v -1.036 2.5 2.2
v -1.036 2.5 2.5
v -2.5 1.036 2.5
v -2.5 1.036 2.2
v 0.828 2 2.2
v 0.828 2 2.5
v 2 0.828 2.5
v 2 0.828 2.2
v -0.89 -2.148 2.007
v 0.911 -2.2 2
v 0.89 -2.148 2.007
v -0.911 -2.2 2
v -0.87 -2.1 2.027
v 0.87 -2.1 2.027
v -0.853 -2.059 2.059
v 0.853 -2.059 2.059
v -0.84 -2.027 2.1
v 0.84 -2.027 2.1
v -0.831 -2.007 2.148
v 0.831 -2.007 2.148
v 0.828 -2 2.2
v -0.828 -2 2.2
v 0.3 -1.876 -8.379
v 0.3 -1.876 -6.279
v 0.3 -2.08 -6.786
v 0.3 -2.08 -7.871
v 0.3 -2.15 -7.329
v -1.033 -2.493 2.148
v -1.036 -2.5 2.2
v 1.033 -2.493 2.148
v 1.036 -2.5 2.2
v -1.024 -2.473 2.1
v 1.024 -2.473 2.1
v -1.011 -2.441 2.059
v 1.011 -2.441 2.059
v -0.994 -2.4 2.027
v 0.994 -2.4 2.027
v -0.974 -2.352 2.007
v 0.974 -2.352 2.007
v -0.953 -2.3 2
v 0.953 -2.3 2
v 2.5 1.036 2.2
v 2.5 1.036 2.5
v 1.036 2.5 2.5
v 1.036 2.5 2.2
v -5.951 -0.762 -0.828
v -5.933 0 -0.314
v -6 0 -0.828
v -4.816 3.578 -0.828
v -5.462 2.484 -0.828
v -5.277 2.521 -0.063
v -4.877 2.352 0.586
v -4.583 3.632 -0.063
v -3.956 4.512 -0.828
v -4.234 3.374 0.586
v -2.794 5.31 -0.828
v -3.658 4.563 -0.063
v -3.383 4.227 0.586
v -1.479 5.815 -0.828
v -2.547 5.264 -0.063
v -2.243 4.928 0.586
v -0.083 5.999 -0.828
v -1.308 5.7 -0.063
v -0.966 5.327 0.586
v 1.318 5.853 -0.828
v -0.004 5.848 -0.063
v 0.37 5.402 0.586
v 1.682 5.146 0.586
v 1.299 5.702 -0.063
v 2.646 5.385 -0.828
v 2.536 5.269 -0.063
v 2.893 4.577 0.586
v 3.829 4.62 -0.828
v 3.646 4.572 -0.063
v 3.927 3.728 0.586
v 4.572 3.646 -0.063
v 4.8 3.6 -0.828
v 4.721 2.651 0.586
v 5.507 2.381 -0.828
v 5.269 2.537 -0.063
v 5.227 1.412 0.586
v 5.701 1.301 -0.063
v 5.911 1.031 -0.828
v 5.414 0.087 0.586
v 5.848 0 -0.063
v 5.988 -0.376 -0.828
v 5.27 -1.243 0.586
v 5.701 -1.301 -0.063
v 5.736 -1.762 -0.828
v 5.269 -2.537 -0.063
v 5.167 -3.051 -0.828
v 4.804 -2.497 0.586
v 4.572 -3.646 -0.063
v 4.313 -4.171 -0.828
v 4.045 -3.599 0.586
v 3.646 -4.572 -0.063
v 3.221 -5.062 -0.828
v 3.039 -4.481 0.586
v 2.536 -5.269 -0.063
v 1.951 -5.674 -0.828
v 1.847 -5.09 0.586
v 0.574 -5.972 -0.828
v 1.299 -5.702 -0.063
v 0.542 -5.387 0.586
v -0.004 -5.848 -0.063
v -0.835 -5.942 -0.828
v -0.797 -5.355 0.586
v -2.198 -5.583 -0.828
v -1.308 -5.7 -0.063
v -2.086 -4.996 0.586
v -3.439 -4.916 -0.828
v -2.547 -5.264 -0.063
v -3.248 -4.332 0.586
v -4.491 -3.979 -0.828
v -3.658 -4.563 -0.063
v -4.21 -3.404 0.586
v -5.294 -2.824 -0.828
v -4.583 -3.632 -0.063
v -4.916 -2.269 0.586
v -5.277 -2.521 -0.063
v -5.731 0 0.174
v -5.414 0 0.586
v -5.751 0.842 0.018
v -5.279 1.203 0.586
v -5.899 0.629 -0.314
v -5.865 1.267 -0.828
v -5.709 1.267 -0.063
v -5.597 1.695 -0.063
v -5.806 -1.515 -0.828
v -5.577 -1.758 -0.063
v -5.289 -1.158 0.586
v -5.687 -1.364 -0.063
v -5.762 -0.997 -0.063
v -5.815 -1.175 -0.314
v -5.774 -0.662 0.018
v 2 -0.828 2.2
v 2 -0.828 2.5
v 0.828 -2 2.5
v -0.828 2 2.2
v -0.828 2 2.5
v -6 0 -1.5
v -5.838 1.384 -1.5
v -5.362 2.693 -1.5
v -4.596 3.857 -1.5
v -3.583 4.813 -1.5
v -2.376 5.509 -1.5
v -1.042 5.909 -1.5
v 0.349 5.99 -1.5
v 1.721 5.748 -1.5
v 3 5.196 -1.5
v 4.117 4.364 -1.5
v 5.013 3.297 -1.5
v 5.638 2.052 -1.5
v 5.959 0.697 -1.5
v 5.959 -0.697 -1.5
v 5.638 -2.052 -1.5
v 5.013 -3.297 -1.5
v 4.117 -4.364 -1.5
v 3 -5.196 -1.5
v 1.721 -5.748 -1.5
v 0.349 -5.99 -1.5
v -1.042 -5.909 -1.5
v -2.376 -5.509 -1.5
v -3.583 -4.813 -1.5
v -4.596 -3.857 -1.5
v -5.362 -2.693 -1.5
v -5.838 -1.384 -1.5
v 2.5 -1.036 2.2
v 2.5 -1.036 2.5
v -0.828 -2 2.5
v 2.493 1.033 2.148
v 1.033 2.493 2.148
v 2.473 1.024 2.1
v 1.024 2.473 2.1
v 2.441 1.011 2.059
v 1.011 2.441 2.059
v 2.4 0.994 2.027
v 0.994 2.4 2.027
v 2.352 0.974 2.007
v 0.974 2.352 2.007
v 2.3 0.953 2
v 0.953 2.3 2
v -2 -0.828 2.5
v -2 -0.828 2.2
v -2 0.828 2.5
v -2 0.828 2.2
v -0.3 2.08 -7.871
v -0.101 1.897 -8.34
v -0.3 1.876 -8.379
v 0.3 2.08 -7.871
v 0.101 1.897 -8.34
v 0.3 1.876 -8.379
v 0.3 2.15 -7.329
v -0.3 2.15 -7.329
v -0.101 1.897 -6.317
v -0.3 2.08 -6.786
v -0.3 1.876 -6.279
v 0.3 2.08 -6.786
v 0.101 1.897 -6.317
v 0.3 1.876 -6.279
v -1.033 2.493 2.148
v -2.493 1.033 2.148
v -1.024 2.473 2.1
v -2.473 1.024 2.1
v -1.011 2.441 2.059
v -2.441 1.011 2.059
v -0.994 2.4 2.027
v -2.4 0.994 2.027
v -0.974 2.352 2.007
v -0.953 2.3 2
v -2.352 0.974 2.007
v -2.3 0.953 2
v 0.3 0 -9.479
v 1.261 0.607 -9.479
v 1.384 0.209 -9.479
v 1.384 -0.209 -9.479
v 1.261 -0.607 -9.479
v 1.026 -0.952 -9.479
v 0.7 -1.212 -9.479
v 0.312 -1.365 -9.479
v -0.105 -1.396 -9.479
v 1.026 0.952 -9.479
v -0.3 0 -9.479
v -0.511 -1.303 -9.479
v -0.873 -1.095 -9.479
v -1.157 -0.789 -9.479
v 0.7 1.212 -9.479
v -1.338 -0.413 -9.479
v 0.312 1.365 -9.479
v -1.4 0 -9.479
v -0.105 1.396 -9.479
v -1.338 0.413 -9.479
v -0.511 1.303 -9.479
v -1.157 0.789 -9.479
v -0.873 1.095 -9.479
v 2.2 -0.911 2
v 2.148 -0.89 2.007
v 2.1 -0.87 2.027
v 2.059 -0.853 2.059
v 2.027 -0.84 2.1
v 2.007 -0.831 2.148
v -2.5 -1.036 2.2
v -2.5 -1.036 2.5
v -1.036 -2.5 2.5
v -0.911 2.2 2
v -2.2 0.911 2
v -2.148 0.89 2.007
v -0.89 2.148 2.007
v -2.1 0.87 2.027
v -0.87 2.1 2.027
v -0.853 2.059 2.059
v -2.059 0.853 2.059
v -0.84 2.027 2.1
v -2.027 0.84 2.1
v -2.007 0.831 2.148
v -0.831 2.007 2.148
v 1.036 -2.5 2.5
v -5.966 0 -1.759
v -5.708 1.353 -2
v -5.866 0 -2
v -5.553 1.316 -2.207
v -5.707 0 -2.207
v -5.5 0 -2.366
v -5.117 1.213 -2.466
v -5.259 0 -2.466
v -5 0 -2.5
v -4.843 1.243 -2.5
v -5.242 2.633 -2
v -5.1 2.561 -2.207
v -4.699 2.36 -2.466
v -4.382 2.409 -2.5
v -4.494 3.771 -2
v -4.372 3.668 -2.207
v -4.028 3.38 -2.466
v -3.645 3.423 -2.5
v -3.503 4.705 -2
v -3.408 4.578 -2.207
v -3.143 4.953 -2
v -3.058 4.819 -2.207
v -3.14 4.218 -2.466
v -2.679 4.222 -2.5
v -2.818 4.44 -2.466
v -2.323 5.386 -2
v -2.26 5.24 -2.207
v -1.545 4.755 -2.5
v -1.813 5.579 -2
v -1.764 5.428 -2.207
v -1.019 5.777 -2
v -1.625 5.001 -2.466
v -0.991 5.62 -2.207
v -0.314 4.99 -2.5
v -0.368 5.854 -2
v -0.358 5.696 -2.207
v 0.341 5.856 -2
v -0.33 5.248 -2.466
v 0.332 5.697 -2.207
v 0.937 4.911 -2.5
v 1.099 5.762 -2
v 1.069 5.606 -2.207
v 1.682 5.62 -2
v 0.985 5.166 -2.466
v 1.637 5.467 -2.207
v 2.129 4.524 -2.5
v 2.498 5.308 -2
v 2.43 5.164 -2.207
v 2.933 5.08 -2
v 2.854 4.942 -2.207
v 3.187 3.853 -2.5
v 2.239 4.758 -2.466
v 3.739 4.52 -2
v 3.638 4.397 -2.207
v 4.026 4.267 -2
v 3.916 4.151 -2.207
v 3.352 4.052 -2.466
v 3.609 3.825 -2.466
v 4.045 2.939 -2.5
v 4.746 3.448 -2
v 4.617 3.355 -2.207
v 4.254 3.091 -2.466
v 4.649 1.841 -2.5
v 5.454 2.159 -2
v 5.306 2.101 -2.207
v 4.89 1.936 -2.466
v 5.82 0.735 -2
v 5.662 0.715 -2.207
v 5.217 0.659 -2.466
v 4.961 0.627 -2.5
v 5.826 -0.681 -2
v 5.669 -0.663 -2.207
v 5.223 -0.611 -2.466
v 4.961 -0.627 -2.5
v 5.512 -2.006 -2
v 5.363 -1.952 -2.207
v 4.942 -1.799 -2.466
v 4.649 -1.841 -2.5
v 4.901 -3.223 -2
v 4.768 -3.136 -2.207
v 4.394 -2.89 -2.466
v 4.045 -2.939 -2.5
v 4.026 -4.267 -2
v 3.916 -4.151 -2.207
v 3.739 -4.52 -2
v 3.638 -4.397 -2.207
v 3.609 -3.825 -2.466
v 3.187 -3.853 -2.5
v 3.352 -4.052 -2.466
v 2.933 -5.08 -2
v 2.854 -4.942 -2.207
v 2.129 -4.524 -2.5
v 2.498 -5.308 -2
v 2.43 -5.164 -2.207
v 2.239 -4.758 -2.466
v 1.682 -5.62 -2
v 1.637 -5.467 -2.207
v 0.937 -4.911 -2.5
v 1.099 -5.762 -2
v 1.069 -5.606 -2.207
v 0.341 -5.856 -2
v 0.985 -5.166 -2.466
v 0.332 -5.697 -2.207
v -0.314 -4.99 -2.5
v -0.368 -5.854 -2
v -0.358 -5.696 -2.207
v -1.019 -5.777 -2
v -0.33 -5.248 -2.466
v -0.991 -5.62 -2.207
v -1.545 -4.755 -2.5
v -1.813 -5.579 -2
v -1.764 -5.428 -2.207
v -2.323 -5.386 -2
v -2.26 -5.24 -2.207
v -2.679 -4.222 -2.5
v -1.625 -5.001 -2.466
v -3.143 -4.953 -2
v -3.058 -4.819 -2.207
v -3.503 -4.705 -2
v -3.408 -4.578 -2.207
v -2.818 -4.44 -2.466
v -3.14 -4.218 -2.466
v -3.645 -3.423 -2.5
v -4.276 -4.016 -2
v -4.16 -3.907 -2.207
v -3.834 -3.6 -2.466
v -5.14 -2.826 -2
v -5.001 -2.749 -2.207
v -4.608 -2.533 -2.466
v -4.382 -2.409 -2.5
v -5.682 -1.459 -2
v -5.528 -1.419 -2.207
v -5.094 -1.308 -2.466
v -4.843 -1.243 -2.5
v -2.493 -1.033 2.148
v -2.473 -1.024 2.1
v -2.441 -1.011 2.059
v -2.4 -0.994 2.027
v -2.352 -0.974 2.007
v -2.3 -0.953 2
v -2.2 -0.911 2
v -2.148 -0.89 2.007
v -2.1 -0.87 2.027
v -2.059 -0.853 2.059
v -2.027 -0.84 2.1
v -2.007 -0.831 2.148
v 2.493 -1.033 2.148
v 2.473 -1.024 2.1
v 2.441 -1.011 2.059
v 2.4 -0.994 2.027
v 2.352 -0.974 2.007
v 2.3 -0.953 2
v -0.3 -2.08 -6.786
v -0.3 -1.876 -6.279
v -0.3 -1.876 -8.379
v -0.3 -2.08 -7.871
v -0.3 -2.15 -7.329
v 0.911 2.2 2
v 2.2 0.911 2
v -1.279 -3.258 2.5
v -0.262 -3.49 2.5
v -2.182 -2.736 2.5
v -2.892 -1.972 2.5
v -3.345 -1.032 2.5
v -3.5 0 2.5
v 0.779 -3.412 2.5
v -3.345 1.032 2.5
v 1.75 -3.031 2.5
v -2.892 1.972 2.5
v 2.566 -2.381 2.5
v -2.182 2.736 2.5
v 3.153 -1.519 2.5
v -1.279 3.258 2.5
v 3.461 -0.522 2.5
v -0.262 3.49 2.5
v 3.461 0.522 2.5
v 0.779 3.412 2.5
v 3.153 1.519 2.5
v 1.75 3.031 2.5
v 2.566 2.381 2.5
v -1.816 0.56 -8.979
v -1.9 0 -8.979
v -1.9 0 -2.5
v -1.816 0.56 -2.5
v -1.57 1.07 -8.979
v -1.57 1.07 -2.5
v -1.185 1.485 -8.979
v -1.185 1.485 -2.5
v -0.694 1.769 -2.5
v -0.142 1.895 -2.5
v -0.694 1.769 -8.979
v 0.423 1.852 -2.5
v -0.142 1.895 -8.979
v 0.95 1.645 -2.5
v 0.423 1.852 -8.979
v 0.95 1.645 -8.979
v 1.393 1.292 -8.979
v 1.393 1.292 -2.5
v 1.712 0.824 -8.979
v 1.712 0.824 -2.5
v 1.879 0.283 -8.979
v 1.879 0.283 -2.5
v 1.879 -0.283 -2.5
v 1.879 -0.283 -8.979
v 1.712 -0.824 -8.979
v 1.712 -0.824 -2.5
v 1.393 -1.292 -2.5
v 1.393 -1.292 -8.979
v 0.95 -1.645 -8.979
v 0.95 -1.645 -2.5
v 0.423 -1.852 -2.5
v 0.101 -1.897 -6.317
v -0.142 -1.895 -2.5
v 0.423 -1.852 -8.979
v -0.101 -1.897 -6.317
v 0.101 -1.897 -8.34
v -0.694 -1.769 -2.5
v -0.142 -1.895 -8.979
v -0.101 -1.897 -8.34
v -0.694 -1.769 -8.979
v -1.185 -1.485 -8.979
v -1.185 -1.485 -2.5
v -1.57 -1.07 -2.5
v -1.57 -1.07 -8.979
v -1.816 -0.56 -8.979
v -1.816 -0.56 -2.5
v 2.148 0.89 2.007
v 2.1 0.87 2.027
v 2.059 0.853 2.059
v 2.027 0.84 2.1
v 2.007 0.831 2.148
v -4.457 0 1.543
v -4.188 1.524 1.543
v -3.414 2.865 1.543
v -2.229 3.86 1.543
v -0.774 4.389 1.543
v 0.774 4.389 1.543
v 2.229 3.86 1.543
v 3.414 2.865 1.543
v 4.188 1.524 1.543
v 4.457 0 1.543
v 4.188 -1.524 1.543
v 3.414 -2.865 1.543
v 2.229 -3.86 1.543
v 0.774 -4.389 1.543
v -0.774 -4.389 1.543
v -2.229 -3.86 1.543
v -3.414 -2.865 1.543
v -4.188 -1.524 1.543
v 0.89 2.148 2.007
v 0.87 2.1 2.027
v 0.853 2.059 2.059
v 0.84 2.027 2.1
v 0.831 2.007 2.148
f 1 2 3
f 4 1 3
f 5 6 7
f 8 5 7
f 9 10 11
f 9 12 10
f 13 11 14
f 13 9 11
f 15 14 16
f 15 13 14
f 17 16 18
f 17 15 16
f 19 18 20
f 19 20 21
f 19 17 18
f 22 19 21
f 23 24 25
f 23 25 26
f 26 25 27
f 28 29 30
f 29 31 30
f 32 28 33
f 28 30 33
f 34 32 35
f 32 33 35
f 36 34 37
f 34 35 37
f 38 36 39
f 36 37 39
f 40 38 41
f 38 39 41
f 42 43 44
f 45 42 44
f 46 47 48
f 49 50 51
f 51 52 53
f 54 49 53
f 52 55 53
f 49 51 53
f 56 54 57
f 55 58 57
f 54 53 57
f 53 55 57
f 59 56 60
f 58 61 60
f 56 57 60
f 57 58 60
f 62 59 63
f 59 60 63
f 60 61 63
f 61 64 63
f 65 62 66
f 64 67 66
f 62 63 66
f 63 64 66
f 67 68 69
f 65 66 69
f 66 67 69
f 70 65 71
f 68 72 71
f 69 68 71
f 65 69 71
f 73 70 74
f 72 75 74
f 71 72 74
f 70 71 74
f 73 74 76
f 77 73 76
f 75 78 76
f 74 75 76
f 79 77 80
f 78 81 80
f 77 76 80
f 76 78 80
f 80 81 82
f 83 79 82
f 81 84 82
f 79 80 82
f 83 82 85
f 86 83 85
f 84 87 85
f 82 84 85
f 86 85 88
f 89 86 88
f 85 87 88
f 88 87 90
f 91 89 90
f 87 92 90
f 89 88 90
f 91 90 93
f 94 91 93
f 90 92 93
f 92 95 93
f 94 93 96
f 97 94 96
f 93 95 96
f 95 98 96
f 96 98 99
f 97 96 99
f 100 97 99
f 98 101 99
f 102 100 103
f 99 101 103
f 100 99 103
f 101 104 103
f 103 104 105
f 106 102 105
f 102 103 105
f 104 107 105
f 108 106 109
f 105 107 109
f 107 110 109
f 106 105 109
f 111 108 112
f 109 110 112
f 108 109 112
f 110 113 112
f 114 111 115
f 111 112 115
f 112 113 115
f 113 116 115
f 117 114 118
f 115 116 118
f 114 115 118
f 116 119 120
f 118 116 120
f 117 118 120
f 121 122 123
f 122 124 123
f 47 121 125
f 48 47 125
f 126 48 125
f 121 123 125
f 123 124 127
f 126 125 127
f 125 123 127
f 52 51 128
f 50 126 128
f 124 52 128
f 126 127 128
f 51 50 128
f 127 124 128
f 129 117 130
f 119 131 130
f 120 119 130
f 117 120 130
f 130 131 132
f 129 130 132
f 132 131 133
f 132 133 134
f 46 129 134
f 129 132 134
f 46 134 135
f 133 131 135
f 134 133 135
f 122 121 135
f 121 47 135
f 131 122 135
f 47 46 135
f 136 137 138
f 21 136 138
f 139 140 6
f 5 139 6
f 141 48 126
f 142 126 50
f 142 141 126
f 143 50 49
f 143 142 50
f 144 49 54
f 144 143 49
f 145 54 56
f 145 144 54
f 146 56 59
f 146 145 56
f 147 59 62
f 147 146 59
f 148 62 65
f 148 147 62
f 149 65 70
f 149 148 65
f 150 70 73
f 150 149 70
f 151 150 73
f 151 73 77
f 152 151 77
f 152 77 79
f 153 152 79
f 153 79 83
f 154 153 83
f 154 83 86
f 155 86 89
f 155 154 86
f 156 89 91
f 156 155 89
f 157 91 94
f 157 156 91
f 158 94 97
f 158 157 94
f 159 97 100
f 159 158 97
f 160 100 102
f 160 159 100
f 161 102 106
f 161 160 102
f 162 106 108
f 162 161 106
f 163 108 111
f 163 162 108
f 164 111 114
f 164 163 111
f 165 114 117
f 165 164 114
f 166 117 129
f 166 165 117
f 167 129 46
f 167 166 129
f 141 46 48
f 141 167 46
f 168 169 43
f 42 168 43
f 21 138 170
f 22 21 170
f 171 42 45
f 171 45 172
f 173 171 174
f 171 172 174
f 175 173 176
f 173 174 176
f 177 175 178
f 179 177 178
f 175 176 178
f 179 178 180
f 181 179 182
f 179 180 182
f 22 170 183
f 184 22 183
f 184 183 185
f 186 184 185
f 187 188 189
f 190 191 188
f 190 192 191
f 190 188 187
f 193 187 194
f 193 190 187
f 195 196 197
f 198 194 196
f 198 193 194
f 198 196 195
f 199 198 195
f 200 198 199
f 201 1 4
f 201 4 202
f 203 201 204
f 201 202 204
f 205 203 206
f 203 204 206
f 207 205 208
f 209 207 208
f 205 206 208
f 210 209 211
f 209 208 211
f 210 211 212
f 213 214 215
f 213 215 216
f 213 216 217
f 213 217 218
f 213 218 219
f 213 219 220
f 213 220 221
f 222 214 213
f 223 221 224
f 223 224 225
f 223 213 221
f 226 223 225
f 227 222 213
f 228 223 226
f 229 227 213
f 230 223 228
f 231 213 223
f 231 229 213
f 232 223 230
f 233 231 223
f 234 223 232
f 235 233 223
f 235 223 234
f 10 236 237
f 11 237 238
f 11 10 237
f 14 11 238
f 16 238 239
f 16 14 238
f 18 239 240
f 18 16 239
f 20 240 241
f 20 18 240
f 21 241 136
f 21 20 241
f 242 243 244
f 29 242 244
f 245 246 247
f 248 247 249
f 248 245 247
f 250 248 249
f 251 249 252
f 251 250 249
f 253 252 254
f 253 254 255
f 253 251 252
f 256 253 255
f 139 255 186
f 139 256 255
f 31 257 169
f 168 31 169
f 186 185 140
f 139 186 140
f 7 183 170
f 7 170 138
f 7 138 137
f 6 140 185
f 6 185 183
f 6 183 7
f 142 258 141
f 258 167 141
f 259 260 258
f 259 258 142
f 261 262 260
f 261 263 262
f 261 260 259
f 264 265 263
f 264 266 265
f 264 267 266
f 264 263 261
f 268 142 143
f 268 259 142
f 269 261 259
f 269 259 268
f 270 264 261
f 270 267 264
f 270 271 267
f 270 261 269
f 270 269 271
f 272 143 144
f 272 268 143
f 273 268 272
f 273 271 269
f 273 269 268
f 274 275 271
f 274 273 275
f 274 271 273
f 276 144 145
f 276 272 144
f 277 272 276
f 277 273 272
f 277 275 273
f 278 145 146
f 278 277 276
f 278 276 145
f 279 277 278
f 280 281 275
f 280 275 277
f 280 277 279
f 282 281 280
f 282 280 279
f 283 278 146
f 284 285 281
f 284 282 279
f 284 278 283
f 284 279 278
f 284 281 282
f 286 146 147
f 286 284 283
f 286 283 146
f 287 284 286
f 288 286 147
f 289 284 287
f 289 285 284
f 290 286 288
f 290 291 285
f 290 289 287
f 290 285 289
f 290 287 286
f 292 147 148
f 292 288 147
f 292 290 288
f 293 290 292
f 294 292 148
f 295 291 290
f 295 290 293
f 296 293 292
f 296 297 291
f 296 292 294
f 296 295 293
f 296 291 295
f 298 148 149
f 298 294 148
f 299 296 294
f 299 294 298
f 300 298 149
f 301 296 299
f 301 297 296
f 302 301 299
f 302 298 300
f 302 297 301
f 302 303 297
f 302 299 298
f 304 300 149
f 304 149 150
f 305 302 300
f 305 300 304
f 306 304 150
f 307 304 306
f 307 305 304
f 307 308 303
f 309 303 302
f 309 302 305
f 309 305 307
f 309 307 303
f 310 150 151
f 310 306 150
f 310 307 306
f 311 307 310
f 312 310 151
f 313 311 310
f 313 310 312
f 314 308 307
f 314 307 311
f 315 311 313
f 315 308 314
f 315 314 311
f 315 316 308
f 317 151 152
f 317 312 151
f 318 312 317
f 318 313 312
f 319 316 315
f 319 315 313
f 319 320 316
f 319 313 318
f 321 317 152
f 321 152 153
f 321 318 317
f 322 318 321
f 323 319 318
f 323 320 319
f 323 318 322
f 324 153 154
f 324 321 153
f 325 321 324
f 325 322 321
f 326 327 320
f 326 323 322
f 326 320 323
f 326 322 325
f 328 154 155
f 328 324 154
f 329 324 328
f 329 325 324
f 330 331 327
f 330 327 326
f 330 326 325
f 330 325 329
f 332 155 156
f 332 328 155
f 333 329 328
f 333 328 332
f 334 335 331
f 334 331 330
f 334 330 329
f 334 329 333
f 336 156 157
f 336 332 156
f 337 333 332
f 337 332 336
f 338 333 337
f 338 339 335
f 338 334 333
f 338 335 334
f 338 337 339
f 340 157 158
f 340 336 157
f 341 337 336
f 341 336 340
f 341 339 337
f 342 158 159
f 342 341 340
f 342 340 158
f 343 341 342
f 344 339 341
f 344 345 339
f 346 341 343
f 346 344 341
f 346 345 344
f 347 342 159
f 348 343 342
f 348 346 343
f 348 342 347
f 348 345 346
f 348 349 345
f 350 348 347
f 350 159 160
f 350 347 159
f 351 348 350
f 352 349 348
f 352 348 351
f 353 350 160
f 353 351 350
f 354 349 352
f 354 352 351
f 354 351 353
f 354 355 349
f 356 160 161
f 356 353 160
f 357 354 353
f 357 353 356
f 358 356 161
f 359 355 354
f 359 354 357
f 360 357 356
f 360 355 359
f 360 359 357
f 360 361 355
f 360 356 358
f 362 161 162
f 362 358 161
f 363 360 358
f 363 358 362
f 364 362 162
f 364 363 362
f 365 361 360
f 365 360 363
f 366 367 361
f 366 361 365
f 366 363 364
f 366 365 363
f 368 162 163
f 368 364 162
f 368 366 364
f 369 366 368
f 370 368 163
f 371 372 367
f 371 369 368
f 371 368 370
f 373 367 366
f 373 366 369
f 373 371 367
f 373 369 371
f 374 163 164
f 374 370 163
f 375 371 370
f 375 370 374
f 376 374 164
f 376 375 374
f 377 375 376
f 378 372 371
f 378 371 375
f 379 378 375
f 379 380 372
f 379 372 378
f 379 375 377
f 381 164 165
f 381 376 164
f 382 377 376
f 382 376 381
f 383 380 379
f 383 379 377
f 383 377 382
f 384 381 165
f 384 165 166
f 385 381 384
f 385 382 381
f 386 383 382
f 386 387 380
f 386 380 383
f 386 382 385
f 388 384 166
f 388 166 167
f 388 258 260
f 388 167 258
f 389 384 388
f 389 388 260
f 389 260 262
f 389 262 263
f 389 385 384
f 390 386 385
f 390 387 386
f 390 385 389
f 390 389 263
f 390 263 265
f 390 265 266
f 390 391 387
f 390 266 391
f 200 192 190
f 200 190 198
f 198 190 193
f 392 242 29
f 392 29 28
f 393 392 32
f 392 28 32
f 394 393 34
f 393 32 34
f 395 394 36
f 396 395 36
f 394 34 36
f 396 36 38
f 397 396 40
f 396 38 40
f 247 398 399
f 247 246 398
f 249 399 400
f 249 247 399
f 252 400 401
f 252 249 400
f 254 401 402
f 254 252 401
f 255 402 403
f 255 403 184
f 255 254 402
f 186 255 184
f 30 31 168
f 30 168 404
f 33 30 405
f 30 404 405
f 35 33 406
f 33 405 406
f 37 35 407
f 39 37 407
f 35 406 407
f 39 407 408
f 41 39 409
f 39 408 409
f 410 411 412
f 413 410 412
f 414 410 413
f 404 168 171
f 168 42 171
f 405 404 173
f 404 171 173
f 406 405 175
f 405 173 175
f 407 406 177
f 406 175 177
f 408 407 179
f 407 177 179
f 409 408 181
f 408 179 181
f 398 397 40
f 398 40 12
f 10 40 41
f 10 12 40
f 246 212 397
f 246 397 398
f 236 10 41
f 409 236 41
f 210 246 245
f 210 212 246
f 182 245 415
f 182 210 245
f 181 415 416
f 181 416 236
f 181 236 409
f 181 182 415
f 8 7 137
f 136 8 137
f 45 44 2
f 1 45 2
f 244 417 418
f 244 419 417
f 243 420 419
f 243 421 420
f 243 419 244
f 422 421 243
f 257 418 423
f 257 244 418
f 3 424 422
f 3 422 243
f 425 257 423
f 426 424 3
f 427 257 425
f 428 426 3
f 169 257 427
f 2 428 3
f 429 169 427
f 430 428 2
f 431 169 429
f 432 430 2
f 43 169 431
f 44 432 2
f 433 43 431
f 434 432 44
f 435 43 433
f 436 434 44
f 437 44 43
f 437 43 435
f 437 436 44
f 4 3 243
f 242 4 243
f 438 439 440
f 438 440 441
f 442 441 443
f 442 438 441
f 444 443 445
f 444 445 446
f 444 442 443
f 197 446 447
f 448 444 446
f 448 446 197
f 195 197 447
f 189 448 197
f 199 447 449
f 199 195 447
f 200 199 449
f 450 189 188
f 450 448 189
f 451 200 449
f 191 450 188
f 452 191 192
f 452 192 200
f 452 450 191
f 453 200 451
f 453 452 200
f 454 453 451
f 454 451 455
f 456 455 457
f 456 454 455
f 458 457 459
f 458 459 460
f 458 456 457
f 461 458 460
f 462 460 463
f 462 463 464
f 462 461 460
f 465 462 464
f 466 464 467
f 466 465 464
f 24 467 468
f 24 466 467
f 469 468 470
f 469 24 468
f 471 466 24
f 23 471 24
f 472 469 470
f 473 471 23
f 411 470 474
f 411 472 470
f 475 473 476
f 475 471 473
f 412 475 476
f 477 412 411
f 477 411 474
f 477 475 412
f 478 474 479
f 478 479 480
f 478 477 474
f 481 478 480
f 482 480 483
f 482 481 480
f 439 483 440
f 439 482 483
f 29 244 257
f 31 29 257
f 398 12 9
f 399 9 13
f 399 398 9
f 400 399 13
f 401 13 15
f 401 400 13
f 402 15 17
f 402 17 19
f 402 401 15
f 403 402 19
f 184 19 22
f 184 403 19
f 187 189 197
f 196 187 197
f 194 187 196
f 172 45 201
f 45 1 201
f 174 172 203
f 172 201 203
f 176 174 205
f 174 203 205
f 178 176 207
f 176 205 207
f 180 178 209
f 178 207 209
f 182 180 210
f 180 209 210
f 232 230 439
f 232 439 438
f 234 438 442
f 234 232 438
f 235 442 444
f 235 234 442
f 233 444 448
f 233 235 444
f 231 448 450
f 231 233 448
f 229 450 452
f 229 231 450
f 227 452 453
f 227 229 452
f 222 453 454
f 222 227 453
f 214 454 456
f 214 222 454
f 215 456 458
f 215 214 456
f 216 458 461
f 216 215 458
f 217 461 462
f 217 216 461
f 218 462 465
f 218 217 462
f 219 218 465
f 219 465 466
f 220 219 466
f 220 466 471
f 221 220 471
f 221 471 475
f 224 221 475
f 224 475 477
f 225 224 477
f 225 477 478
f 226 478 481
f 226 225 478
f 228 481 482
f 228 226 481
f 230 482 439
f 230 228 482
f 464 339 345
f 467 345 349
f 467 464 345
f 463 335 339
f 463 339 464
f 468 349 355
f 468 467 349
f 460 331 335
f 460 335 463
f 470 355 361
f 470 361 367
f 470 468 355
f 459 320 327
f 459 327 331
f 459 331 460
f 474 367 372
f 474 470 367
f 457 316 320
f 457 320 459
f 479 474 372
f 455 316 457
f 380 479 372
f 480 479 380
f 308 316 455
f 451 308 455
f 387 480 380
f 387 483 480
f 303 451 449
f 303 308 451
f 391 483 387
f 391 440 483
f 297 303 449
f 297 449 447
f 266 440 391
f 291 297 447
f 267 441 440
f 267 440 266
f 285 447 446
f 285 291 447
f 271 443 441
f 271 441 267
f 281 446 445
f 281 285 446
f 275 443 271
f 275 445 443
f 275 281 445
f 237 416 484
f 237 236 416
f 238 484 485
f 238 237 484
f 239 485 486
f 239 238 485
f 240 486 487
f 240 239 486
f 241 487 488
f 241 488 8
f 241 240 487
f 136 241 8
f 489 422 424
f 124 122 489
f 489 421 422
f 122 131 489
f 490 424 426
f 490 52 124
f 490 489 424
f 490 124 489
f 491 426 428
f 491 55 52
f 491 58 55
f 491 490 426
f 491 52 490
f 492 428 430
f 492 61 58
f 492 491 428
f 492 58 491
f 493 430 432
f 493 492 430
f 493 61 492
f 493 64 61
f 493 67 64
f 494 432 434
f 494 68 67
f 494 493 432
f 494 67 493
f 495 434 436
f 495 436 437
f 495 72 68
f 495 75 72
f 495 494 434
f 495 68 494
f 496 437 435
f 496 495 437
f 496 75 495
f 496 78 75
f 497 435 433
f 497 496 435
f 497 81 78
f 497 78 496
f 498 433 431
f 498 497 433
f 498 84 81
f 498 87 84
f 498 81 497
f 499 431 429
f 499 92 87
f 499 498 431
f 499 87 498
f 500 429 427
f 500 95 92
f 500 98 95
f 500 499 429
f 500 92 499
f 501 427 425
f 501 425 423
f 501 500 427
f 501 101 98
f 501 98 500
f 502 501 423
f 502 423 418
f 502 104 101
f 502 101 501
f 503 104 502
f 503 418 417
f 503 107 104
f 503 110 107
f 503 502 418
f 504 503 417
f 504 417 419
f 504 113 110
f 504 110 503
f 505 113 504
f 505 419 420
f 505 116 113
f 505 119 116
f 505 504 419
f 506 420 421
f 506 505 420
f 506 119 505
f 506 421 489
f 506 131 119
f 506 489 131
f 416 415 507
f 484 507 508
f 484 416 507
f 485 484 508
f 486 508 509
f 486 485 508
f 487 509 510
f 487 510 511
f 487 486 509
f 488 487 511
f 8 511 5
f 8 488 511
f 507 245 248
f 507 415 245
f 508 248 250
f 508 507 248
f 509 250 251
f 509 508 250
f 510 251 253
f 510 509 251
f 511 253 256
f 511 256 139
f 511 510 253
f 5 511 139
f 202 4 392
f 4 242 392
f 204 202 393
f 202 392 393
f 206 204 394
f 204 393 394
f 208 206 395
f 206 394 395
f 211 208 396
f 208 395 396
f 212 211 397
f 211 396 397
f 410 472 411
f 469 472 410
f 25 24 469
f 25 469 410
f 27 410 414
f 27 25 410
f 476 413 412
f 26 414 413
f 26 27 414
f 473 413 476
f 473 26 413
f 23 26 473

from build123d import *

# Parameters (mm, degrees)
F2_R     = 2
F3_R     = 1
F4_R     = 2.15
F5_DEPTH = 0.3
F7_DEPTH = 0.5
F8_R     = 0.2
F9_SIZE  = 0.5


with BuildPart() as f1:
    # F0 (on Front) → F1 (revolve)
    with BuildSketch(Plane.XZ):
        Polygon((-1.9, -9.478535), (0, -9.478535), (0, 2.5), (-3.5, 2.5), (-6, 0), (-6, -2.5), (-1.9, -2.5), align=None)
    revolve(axis=Axis((0, 0, -3.489268), (0, 0, -1)))

    # F2
    f2_edges = [f1.edges().sort_by_distance(p)[0] for p in [
        (6, 0, 0),
    ]]
    fillet(f2_edges, radius=F2_R)

    # F3
    f3_edges = [f1.edges().sort_by_distance(p)[0] for p in [
        (6, 0, -2.5),
    ]]
    fillet(f3_edges, radius=F3_R)

    # F4 (on Right) → F5 (join, symmetric)
    with BuildSketch(Plane.YZ):
        with Locations((0, -7.328535)):
            Circle(F4_R)
    extrude(amount=F5_DEPTH, both=True)

    # F6 (on face) → F7 (cut)
    with BuildSketch(Plane.XY.offset(2.5)):
        Polygon((-1.035534, 2.5), (-2.5, 1.035534), (-2.5, -1.035534), (-1.035534, -2.5), (1.035534, -2.5), (2.5, -1.035534), (2.5, 1.035534), (1.035534, 2.5), align=None)
        Polygon((-2, -0.828427), (-2, 0.828427), (-0.828427, 2), (0.828427, 2), (2, 0.828427), (2, -0.828427), (0.828427, -2), (-0.828427, -2), align=None, mode=Mode.SUBTRACT)
    extrude(amount=-F7_DEPTH, mode=Mode.SUBTRACT)

    # F8
    f8_edges = [f1.edges().sort_by_distance(p)[0] for p in [
        (-1.767767, 1.767767, 2),
        (-2.5, 0, 2),
        (-1.767767, -1.767767, 2),
        (0, -2.5, 2),
        (1.767767, -1.767767, 2),
        (2.5, 0, 2),
        (1.767767, 1.767767, 2),
        (0, 2.5, 2),
        (0, -2, 2),
        (-1.414214, -1.414214, 2),
        (-2, 0, 2),
        (-1.414214, 1.414214, 2),
        (0, 2, 2),
        (1.414214, 1.414214, 2),
        (2, 0, 2),
        (1.414214, -1.414214, 2),
    ]]
    fillet(f8_edges, radius=F8_R)

    # F9
    f9_edges = [f1.edges().sort_by_distance(p)[0] for p in [
        (1.9, 0, -9.478535),
    ]]
    chamfer(f9_edges, length=F9_SIZE)


solid = f1.part
